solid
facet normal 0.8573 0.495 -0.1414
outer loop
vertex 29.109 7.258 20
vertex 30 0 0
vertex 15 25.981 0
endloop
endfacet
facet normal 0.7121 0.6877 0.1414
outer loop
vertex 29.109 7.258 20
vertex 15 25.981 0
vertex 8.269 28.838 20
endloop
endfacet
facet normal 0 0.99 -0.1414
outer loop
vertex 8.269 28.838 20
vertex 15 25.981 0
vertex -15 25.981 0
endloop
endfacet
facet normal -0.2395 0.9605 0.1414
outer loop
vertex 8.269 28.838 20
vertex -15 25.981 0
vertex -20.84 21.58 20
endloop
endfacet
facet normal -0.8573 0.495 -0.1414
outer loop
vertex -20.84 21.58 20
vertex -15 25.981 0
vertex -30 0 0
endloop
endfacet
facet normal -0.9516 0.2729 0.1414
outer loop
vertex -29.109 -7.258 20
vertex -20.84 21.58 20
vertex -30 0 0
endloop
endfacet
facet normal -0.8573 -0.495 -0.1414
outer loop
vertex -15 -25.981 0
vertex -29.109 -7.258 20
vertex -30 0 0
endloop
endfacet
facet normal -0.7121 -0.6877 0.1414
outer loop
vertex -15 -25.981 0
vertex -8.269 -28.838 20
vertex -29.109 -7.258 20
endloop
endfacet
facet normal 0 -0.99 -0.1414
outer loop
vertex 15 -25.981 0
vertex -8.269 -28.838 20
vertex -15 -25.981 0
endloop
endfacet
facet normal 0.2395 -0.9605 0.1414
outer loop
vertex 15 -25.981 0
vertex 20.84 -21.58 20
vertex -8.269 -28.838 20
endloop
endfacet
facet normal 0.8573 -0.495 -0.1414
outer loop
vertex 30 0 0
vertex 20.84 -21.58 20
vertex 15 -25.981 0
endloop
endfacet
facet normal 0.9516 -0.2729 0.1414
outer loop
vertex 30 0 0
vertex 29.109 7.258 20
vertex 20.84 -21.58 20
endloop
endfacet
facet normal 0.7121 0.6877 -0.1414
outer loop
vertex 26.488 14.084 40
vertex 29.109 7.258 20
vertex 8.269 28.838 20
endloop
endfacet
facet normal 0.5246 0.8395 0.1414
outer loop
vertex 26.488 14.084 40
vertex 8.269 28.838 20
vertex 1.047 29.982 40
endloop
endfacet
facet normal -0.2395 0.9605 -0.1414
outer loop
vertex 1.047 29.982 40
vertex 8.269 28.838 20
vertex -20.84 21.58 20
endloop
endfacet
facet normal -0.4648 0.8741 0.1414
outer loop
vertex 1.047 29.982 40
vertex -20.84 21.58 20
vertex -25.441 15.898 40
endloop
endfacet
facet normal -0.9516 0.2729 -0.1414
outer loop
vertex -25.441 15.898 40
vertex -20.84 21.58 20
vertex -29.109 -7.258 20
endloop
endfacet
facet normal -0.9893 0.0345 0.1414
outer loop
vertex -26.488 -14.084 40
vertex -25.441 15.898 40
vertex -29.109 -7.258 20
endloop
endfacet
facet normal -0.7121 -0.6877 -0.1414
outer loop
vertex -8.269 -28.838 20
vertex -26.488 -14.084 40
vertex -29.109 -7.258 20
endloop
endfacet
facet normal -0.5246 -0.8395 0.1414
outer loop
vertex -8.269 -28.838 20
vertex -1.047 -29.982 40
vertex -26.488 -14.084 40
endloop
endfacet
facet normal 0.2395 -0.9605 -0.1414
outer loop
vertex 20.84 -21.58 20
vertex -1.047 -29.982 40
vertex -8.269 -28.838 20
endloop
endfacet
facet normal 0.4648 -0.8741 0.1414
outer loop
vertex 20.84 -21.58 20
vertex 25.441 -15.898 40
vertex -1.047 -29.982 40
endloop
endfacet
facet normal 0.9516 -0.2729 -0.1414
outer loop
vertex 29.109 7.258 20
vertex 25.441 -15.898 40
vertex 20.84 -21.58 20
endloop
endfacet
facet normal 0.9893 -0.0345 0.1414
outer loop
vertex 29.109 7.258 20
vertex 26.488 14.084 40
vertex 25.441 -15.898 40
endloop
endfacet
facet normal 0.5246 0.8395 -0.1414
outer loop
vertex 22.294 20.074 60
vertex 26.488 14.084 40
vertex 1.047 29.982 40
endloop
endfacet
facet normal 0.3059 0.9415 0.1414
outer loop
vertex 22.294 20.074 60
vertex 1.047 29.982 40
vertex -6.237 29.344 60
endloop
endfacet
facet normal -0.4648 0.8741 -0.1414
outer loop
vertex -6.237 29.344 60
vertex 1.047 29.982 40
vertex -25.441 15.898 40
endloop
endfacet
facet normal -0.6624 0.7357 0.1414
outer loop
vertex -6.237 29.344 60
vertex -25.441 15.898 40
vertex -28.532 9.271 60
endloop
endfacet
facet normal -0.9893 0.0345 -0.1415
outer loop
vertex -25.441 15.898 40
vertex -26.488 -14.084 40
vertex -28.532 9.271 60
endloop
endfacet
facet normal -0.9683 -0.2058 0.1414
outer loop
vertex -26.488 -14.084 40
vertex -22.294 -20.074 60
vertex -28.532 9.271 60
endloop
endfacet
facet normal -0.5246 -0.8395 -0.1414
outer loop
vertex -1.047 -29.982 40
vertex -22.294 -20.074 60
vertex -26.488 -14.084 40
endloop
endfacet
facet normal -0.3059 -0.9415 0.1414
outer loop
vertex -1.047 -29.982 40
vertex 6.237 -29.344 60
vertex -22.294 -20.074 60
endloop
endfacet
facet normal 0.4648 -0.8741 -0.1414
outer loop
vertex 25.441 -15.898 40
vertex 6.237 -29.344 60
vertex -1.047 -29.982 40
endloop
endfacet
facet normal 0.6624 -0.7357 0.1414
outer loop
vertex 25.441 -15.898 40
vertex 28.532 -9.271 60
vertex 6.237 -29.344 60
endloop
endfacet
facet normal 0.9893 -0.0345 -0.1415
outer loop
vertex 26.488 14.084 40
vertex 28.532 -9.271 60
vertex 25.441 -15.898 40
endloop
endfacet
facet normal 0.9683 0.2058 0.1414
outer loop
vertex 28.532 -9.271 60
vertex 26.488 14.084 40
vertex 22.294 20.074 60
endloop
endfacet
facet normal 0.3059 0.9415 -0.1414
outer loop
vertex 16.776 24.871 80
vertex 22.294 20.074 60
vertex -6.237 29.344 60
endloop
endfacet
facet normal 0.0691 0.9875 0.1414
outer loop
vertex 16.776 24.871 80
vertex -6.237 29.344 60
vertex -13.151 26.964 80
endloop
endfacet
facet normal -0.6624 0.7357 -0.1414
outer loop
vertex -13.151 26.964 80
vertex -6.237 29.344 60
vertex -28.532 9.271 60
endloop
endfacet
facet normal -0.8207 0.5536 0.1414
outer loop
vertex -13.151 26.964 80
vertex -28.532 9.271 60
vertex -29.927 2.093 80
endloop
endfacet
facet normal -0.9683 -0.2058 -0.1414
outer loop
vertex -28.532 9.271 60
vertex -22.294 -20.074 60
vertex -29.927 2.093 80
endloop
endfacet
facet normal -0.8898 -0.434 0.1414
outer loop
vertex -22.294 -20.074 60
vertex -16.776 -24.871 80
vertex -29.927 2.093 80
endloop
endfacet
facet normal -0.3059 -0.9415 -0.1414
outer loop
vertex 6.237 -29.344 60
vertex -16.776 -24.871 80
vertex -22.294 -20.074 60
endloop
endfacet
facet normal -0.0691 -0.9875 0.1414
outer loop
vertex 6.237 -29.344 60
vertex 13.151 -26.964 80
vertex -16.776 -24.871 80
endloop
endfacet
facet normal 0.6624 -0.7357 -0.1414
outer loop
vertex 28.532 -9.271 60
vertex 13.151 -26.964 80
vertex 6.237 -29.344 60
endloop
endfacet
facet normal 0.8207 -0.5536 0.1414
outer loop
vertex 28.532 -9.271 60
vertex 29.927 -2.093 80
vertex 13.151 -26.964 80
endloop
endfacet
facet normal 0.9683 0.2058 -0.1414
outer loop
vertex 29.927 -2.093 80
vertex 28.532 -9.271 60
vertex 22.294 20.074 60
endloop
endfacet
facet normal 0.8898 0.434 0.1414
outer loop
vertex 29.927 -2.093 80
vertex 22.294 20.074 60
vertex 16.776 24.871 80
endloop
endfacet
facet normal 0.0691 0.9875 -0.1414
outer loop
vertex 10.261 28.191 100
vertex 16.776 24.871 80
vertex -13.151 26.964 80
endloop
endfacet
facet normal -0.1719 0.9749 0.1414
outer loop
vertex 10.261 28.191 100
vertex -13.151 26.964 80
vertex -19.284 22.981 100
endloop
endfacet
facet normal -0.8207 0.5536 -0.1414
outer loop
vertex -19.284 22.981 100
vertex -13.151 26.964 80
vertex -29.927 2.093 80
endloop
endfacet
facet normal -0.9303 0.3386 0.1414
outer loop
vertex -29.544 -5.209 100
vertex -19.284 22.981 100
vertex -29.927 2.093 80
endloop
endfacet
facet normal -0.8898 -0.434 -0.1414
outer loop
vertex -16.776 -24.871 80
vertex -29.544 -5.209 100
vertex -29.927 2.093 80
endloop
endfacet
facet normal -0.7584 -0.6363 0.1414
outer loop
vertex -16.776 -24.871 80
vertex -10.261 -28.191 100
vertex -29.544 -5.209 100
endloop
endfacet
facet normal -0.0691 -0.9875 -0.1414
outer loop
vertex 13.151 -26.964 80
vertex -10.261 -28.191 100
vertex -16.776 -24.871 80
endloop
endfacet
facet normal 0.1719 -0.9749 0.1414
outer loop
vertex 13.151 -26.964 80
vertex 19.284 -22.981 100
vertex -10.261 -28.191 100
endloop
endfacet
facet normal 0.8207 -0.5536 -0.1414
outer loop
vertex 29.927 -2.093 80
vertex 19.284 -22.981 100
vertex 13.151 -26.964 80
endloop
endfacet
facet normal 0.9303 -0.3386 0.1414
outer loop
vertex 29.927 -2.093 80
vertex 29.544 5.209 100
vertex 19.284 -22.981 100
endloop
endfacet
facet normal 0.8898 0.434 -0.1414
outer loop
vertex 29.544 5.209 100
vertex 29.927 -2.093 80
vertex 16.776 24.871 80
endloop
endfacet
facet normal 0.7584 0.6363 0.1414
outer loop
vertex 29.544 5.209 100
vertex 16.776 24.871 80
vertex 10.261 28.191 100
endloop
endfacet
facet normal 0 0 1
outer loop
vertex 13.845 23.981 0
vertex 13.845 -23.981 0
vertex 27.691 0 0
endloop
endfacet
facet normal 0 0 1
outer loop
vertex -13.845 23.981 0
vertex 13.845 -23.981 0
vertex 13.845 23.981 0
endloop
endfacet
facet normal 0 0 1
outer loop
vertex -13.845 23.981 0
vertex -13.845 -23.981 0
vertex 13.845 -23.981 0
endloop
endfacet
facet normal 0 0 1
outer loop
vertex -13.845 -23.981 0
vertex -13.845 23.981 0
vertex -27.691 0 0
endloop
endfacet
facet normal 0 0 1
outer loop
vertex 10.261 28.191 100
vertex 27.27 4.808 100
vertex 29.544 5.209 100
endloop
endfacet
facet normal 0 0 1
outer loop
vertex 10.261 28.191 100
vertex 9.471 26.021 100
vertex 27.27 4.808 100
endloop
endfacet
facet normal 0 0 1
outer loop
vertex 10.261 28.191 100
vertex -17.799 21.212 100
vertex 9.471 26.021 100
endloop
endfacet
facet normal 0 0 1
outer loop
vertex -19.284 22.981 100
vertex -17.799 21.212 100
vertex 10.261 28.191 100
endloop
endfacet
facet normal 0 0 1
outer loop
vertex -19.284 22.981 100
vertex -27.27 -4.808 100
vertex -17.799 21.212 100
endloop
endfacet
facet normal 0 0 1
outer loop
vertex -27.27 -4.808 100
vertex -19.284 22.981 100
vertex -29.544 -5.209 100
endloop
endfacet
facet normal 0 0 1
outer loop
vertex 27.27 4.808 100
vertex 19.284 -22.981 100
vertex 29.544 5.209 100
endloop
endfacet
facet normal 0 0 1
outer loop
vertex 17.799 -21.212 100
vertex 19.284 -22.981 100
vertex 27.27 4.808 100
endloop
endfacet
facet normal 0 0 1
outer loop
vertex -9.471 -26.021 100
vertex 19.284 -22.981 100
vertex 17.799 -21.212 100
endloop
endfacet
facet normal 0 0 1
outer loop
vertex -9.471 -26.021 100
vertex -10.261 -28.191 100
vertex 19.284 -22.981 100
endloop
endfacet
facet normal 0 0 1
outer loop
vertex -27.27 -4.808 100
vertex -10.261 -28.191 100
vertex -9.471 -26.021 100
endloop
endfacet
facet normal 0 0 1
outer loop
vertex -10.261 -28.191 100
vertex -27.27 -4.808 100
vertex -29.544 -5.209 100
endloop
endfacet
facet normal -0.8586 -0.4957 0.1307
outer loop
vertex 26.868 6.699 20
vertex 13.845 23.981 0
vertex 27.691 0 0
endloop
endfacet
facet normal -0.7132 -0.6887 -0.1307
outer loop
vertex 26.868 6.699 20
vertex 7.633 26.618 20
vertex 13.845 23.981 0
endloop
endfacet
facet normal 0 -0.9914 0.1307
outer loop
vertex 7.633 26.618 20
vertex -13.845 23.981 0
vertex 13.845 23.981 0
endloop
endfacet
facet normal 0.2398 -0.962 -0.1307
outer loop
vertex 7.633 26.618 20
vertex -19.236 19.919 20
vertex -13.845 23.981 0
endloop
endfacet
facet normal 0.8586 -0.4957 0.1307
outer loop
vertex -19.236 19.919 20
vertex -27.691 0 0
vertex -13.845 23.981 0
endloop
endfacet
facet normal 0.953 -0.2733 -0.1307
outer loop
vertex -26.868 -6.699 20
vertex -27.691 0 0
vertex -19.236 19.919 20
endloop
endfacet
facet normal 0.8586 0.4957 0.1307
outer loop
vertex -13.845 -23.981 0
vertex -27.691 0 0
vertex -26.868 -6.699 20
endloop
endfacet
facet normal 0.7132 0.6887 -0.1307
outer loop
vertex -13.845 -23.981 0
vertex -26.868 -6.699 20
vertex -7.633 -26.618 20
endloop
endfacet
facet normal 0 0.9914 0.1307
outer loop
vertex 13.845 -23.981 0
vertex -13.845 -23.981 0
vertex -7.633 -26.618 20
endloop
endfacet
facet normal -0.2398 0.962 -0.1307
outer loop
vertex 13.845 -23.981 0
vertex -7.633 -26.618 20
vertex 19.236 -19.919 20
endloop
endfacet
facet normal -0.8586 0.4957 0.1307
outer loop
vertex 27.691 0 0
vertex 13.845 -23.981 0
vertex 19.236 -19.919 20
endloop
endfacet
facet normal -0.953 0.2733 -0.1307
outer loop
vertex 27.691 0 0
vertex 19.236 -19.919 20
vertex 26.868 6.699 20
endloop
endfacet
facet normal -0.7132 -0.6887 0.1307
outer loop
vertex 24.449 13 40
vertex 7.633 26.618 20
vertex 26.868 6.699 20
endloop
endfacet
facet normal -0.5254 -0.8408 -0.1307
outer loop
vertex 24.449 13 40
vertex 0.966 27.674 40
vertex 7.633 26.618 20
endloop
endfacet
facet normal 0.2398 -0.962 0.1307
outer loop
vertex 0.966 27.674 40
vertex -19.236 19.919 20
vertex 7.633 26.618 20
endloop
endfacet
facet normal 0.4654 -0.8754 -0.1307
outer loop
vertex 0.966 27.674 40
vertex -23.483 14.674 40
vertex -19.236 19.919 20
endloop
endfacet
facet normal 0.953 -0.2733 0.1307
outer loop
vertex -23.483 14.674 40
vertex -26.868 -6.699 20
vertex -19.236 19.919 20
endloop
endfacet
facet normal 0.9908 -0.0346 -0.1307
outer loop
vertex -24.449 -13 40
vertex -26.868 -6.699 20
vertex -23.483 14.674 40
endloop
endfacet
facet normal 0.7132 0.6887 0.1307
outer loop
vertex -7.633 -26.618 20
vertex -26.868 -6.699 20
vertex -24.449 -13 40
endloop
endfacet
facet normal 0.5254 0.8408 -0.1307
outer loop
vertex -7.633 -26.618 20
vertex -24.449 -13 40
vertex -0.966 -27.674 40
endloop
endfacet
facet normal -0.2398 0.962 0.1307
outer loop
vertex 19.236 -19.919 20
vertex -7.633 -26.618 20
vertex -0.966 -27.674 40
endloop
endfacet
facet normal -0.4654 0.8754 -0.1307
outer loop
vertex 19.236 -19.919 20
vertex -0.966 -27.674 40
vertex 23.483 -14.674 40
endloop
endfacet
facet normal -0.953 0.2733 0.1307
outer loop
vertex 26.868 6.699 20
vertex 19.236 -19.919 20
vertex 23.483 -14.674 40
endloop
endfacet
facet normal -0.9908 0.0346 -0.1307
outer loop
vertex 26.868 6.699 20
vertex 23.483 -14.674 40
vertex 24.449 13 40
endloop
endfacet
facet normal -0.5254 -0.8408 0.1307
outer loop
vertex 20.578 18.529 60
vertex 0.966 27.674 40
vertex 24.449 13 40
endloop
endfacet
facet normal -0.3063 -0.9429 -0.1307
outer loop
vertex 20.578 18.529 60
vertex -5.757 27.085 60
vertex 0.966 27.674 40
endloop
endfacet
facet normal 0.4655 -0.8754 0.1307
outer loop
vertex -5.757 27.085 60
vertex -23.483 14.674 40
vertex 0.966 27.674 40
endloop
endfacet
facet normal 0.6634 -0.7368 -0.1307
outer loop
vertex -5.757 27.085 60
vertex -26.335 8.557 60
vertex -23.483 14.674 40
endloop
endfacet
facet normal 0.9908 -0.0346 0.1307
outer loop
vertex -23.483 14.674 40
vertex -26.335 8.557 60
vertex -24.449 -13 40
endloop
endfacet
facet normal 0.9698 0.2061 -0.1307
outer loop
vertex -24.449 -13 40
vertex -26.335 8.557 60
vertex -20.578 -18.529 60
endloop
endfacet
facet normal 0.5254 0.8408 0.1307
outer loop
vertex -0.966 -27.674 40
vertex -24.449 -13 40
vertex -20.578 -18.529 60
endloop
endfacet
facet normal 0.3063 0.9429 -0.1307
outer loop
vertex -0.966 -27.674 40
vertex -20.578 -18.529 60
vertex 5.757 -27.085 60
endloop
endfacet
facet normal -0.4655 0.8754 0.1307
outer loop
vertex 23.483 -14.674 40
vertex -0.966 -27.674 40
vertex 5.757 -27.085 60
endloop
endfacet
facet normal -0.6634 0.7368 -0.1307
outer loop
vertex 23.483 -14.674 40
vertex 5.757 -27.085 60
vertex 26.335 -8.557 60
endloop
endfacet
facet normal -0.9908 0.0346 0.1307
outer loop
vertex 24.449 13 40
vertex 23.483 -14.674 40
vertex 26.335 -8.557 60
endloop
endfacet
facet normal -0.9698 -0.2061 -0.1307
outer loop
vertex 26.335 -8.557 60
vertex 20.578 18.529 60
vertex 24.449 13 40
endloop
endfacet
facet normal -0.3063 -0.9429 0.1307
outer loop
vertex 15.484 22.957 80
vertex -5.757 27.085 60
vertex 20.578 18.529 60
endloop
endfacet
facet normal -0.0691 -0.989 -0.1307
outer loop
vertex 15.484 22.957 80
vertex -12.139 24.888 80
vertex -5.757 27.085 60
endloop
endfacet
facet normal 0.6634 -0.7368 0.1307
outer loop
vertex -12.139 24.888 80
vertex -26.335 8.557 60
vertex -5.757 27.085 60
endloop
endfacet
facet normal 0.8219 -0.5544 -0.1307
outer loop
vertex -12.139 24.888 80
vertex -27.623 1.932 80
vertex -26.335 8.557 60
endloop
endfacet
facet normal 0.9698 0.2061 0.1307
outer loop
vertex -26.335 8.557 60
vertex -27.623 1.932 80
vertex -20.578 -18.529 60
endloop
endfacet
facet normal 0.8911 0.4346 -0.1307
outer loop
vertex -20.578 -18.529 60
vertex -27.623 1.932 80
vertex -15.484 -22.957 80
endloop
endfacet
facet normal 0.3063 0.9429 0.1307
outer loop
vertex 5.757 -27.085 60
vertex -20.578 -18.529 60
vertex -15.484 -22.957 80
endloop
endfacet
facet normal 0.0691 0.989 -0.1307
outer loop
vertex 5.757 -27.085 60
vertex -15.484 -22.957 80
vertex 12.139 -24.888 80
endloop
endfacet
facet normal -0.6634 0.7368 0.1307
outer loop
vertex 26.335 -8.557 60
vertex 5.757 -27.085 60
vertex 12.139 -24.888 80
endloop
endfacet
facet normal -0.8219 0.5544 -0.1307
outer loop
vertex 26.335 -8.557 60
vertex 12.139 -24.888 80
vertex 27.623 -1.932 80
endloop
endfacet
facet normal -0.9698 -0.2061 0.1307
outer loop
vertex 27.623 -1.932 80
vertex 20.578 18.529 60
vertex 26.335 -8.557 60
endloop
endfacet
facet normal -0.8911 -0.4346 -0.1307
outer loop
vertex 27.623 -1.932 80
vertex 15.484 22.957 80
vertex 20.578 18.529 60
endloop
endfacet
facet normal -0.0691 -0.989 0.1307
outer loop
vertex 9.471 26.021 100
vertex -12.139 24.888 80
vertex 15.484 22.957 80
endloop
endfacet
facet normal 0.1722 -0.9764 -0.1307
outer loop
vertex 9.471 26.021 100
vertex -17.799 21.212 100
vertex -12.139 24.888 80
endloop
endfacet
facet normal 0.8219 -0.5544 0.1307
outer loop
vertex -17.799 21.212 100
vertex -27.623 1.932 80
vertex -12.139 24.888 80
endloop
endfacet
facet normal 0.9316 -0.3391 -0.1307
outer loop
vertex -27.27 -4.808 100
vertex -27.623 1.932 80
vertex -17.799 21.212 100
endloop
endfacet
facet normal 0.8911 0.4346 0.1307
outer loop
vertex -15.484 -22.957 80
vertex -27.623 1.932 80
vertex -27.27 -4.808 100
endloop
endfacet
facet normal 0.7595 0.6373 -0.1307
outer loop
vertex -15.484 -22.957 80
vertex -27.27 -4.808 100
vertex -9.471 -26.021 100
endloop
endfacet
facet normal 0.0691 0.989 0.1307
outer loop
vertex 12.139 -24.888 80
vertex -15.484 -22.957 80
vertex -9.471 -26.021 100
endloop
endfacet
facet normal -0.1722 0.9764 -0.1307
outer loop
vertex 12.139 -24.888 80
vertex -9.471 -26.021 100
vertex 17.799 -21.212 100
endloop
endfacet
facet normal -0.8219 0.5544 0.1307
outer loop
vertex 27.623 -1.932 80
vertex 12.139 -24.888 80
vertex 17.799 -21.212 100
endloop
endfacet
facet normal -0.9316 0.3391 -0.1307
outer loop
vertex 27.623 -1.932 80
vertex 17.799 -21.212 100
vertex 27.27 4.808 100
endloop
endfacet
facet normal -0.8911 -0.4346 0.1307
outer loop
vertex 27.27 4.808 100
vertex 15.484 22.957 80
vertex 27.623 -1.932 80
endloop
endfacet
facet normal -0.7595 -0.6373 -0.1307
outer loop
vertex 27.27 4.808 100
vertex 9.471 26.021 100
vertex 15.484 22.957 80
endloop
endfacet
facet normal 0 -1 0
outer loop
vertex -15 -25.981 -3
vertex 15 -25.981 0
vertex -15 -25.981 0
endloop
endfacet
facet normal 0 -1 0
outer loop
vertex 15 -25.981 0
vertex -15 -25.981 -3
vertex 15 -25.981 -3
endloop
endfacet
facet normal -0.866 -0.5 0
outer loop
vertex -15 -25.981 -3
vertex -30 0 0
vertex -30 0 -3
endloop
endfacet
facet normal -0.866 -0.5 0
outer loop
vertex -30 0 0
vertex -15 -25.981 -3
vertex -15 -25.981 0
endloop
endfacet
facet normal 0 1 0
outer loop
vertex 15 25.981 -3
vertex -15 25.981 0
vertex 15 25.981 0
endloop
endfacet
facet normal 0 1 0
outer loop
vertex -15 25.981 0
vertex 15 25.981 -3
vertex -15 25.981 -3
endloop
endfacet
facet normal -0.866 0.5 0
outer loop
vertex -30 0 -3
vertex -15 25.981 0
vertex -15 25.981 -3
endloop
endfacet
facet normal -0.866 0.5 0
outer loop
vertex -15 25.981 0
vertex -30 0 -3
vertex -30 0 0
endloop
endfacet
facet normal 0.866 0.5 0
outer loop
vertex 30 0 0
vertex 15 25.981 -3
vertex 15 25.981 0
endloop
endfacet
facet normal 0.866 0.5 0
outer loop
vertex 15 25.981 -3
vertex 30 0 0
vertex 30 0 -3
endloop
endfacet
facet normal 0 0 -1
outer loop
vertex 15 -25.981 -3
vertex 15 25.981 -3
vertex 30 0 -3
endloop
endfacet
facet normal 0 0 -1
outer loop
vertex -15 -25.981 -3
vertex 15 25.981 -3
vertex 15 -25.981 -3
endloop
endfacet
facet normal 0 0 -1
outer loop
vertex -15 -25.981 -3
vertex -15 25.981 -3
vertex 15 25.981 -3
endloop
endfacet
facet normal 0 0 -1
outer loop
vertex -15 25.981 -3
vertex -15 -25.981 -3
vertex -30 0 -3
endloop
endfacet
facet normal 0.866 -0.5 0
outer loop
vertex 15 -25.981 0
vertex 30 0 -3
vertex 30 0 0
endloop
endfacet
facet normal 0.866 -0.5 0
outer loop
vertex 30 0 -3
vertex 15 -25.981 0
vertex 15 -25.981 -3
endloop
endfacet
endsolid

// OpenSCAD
//number of sides
sides = 6;
//spacing of Z levels
z_spacing = 20;
//maximum radius, center to outer vertex
m_radius = 30;
//thickness
thickness = 2;
// number of levels 
nlevel = 5;
//phase angle change, determines twistiness
phasediff = 14;
//base thickness, if 0 there is no base.
bthick = 3;

//function twist(level,spacing) = sin(level*spacing*period)*amp + slope*level*spacing

module makepolyhelix(level,side,spacing,radius,phase){// level = # of levels, side = number of sides of polygon, spacing = length between levels, radius = distance from center to vertex of polygon, phase = number of degrees the polygon is rotated on every level 
    points = [for (i = [0:level]) for (j = [0:(side -1)]) [radius*cos(i*phase + j*(360/side)),radius*sin(i*phase + j*(360/side)),i*spacing] ];
    //generate two triangular faces for each generation of nested for loop, not sure how to make this more readable
    faces = [for (i = [0:(level-1)]) for (j = [0:(side -1)]) each 
        [ [j+(i*side), j+side*(i+1), (j+1)%side+i*side],
        [(j+1)%side+(i*side), j+side*(i+1), ((j+1)%side)+(i+1)*side]]];
    
    bottomface = [for (i = [0:side-1]) i];
    topface = [for (i = [1:side]) side*(level+1)-i];
    
    faces2 = concat(faces,[bottomface],[topface]);
    
    polyhedron(points,faces2);
}
            
i_radius = m_radius - thickness/cos((360/sides)/2);// calculates inner radius from thickness and outer radius.
difference(){
    makepolyhelix(nlevel,sides,z_spacing,m_radius,phasediff);
    makepolyhelix(nlevel,sides,z_spacing,i_radius,phasediff);
}
if (bthick > 0){
translate([0,0,-bthick]){makepolyhelix(1,sides,bthick,m_radius,0);}
}
